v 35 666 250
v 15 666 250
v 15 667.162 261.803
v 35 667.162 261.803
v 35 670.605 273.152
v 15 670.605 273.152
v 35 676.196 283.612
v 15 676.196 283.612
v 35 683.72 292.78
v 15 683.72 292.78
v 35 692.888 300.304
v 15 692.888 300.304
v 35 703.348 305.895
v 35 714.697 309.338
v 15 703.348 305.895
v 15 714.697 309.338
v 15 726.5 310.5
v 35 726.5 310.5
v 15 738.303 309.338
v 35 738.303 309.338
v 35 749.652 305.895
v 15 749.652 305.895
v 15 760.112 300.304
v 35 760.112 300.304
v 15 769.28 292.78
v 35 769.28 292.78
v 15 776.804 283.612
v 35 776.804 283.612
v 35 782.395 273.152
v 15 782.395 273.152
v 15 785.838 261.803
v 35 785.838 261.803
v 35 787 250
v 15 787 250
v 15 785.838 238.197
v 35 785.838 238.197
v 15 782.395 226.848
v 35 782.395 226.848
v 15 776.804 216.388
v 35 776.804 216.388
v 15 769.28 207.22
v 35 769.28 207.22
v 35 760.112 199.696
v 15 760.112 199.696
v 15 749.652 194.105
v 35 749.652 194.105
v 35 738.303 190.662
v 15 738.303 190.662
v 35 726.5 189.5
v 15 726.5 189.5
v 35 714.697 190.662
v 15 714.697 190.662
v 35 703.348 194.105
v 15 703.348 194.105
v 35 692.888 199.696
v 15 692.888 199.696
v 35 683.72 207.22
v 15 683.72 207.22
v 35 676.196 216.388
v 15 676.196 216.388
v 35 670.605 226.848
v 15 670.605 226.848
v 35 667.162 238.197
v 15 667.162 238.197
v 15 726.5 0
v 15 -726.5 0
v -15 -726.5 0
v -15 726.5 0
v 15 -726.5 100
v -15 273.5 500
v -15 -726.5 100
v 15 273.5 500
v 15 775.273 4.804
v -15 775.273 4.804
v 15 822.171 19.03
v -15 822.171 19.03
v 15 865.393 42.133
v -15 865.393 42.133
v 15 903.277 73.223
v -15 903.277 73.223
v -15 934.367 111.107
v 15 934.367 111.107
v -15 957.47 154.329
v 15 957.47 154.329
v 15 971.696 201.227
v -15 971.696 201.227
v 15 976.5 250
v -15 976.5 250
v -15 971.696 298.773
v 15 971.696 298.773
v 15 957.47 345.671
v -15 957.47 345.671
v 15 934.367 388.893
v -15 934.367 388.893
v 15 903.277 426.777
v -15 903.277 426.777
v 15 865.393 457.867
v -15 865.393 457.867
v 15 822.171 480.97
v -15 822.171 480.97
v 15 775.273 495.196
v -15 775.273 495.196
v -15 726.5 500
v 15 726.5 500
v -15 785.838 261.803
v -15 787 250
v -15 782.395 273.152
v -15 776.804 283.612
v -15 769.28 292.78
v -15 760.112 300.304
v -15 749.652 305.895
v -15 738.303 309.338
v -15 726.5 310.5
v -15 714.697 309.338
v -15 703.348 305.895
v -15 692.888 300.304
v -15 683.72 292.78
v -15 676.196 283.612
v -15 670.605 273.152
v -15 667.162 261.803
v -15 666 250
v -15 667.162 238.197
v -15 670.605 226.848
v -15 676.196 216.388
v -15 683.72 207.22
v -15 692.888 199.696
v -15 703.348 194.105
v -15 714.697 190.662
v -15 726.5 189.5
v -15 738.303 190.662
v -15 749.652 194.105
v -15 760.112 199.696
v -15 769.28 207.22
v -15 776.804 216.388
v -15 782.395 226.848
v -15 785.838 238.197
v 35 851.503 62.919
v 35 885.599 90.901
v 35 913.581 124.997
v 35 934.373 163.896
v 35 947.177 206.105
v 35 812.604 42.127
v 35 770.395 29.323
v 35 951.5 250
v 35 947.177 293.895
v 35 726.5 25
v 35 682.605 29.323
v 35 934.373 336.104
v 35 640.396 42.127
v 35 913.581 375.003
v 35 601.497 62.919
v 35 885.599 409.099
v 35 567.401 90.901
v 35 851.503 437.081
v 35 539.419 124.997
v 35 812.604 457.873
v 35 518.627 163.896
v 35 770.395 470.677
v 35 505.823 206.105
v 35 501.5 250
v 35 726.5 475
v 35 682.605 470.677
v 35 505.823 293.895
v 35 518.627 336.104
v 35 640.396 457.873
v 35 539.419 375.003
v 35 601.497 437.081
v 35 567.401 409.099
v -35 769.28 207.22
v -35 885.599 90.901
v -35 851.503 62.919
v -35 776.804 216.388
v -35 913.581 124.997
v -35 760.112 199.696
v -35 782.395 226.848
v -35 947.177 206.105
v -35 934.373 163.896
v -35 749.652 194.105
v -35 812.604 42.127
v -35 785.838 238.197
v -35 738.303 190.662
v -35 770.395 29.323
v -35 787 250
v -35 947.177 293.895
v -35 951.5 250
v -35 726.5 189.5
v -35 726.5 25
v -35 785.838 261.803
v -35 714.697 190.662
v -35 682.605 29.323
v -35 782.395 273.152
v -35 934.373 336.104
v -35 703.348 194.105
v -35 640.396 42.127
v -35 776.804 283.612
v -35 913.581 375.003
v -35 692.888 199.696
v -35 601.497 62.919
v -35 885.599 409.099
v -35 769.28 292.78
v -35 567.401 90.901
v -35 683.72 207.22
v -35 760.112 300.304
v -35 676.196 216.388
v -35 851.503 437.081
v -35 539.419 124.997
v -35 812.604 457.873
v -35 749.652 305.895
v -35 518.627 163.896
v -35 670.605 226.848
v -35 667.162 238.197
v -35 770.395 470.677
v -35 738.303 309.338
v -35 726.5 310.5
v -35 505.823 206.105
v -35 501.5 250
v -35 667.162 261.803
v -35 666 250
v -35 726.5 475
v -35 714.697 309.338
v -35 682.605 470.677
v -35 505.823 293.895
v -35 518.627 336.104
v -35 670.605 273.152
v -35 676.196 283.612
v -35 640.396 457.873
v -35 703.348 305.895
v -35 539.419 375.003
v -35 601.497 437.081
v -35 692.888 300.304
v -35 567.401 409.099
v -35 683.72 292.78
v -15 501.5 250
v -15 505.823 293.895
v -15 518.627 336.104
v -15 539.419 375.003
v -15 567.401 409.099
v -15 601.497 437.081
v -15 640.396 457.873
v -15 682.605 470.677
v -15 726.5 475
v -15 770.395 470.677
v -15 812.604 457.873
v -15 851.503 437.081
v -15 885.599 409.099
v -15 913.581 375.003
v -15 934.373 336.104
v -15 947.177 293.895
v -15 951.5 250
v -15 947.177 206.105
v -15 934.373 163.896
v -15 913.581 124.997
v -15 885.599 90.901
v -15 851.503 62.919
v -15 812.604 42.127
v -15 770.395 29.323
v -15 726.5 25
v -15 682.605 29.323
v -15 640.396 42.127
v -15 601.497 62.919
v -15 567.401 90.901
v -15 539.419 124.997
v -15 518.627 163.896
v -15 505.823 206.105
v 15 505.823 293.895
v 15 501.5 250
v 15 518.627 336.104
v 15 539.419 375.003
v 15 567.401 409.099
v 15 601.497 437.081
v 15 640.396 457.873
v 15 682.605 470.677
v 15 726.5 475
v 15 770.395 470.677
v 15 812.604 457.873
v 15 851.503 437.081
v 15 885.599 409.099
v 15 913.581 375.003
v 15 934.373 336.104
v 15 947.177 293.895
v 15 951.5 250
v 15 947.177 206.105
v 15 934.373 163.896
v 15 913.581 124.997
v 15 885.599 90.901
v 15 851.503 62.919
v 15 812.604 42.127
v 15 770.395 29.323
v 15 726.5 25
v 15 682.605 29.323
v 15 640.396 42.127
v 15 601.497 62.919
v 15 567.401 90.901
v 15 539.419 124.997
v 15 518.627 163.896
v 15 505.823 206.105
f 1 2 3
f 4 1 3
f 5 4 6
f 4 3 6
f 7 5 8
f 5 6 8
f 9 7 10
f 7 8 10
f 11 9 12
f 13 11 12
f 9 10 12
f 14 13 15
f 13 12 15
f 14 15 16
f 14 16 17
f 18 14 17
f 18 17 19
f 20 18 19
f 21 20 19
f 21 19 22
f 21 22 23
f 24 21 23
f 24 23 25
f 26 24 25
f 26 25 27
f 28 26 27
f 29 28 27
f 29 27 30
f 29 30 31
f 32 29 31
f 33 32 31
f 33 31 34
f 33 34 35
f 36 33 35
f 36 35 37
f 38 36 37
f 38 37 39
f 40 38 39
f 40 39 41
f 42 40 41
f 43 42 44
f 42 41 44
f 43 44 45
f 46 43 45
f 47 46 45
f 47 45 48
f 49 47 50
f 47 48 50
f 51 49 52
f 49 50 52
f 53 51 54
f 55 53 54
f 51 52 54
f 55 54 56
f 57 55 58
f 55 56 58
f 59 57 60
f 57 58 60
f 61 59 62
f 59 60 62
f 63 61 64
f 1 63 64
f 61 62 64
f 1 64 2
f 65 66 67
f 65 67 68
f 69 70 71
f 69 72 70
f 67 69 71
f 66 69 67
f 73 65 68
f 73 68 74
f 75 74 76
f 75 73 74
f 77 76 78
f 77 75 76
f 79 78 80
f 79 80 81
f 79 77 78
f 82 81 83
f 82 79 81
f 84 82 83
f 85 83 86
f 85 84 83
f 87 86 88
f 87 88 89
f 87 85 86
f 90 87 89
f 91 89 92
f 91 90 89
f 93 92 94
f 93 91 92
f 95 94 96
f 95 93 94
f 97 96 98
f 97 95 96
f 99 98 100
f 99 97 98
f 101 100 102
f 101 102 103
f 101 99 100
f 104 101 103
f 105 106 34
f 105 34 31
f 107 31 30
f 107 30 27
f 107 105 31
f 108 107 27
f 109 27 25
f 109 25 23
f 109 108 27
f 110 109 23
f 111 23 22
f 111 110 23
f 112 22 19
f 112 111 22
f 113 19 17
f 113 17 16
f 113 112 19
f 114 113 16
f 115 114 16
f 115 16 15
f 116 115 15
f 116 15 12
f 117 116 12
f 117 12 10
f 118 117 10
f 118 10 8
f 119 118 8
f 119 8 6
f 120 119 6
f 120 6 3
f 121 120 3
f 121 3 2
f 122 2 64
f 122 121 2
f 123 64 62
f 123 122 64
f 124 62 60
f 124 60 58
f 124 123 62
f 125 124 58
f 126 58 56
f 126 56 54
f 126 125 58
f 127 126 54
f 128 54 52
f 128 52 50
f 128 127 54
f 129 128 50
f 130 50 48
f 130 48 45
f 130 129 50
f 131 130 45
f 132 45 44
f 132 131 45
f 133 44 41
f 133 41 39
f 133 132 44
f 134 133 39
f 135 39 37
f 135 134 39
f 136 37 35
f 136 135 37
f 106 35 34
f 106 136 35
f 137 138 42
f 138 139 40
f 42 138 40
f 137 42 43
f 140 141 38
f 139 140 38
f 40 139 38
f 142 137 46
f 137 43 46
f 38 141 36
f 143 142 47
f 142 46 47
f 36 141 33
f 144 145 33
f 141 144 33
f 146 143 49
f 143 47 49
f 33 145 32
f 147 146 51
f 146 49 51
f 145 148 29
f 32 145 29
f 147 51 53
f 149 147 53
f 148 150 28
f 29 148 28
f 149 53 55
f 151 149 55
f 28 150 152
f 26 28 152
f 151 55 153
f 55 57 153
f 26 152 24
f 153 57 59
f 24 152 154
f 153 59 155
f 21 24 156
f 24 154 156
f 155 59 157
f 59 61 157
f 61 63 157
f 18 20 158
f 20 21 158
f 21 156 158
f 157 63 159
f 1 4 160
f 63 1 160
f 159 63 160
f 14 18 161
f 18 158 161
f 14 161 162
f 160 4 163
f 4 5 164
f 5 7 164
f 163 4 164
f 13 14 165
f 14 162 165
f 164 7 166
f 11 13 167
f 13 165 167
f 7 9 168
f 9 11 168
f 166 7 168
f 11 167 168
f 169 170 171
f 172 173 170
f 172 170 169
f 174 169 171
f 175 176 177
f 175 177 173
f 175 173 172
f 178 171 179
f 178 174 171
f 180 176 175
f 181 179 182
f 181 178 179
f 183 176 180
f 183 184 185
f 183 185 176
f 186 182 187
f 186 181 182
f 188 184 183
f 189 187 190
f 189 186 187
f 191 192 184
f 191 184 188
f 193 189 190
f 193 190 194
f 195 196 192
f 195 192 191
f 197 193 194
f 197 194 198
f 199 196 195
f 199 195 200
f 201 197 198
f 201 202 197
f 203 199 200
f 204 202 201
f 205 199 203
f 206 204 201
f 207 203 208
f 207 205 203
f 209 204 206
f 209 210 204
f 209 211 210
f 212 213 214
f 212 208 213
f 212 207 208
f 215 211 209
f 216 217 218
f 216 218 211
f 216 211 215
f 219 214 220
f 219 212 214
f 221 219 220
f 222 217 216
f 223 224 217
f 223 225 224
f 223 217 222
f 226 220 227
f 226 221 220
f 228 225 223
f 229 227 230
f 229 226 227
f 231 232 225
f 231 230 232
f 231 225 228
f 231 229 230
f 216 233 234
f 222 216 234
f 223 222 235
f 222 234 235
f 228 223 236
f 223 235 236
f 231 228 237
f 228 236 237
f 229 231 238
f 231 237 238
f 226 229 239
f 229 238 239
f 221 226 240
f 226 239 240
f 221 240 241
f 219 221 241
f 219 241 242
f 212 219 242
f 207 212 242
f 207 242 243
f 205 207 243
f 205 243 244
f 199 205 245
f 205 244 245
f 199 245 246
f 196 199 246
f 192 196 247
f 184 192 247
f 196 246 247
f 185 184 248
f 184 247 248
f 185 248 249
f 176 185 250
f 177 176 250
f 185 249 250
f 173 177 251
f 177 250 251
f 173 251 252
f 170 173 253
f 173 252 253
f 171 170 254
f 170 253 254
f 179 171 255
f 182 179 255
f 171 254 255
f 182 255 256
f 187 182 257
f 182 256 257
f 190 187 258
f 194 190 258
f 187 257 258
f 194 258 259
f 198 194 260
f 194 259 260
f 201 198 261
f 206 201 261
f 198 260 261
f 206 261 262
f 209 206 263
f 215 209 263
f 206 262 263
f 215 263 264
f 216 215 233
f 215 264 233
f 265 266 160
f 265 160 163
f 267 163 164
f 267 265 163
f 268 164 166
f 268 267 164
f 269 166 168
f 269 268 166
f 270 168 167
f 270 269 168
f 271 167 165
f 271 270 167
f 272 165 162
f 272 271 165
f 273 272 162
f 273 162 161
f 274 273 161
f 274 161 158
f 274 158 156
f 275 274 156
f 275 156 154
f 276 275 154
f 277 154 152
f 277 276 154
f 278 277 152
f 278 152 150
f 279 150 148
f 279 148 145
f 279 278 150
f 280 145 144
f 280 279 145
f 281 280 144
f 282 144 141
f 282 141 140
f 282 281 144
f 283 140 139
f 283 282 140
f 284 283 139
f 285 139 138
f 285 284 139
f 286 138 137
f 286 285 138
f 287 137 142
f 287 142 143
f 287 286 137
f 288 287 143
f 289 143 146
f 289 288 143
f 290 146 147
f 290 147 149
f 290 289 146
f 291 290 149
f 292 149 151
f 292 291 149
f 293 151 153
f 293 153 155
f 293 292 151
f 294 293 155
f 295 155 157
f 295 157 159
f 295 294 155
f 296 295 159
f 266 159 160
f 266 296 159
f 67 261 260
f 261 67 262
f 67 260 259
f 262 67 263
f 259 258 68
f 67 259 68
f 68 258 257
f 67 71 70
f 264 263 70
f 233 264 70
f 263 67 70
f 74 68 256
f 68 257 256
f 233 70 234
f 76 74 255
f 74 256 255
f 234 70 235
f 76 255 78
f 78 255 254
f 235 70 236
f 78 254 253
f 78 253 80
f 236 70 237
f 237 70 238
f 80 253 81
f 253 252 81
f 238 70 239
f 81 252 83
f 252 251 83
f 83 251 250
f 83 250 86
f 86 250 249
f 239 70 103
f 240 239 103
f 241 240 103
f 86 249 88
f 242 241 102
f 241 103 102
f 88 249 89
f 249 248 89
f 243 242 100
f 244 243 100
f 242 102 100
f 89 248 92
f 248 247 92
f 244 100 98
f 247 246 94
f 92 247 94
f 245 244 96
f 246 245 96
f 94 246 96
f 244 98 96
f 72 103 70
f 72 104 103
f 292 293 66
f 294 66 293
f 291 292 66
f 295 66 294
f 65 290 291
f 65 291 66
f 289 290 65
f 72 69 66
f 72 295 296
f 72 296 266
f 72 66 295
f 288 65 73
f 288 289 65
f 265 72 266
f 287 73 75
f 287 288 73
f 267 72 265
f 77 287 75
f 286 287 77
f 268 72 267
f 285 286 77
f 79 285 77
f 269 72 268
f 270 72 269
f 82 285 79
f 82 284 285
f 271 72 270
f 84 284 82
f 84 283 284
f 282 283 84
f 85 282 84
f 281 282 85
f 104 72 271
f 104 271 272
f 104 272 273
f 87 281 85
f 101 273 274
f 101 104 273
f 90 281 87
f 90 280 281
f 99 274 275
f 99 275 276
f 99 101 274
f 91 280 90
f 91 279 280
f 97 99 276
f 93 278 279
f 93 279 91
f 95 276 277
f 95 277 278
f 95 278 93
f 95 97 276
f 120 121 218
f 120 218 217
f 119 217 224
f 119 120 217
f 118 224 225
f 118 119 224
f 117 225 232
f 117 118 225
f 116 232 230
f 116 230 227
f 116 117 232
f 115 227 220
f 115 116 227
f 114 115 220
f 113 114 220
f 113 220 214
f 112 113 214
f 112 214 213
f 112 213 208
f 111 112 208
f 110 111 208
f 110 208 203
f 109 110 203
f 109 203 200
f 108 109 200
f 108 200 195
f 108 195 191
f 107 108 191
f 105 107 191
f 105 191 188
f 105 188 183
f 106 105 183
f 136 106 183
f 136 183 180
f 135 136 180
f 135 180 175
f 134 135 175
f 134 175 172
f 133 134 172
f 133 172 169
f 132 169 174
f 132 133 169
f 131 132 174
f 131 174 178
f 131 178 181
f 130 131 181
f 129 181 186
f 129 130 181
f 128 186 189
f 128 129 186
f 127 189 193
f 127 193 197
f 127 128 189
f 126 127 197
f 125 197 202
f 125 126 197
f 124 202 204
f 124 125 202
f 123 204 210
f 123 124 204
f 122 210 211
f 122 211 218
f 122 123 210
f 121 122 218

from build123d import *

# Parameters (mm, degrees)
F0_R     = 225
F0_R_2   = 60.5
F1_DEPTH = 15
F2_R     = 225
F2_R_2   = 60.5
F3_DEPTH = 20


with BuildPart() as f1:
    # F0 (on Right) → F1 (new body, symmetric)
    with BuildSketch(Plane.YZ):
        with BuildLine():
            Line((-726.5, 100), (-726.5, 0))
            Line((-726.5, 0), (726.5, 0))
            ThreePointArc((726.5, 0), (976.5, 250), (726.5, 500))
            Line((726.5, 500), (273.5, 500))
            Line((273.5, 500), (-726.5, 100))
        make_face()
        with Locations((726.5, 250)):
            Circle(F0_R, mode=Mode.SUBTRACT)
        with Locations((726.5, 250)):
            Circle(F0_R)
        with Locations((726.5, 250)):
            Circle(F0_R_2, mode=Mode.SUBTRACT)
    extrude(amount=F1_DEPTH, both=True)

    # F2 (on face) → F3 (join)
    with BuildSketch(Plane(origin=(-15, 0, 0), x_dir=(0, -1, 0), z_dir=(-1, 0, 0))):
        with Locations((-726.5, 250)):
            Circle(F2_R)
        with Locations((-726.5, 250)):
            Circle(F2_R_2, mode=Mode.SUBTRACT)
    extrude(amount=F3_DEPTH)

    # F4: F1 across plane


with BuildPart() as f1_1:
    add(f1.part)
    add(f1.part.mirror(Plane.YZ))


solid = f1_1.part
